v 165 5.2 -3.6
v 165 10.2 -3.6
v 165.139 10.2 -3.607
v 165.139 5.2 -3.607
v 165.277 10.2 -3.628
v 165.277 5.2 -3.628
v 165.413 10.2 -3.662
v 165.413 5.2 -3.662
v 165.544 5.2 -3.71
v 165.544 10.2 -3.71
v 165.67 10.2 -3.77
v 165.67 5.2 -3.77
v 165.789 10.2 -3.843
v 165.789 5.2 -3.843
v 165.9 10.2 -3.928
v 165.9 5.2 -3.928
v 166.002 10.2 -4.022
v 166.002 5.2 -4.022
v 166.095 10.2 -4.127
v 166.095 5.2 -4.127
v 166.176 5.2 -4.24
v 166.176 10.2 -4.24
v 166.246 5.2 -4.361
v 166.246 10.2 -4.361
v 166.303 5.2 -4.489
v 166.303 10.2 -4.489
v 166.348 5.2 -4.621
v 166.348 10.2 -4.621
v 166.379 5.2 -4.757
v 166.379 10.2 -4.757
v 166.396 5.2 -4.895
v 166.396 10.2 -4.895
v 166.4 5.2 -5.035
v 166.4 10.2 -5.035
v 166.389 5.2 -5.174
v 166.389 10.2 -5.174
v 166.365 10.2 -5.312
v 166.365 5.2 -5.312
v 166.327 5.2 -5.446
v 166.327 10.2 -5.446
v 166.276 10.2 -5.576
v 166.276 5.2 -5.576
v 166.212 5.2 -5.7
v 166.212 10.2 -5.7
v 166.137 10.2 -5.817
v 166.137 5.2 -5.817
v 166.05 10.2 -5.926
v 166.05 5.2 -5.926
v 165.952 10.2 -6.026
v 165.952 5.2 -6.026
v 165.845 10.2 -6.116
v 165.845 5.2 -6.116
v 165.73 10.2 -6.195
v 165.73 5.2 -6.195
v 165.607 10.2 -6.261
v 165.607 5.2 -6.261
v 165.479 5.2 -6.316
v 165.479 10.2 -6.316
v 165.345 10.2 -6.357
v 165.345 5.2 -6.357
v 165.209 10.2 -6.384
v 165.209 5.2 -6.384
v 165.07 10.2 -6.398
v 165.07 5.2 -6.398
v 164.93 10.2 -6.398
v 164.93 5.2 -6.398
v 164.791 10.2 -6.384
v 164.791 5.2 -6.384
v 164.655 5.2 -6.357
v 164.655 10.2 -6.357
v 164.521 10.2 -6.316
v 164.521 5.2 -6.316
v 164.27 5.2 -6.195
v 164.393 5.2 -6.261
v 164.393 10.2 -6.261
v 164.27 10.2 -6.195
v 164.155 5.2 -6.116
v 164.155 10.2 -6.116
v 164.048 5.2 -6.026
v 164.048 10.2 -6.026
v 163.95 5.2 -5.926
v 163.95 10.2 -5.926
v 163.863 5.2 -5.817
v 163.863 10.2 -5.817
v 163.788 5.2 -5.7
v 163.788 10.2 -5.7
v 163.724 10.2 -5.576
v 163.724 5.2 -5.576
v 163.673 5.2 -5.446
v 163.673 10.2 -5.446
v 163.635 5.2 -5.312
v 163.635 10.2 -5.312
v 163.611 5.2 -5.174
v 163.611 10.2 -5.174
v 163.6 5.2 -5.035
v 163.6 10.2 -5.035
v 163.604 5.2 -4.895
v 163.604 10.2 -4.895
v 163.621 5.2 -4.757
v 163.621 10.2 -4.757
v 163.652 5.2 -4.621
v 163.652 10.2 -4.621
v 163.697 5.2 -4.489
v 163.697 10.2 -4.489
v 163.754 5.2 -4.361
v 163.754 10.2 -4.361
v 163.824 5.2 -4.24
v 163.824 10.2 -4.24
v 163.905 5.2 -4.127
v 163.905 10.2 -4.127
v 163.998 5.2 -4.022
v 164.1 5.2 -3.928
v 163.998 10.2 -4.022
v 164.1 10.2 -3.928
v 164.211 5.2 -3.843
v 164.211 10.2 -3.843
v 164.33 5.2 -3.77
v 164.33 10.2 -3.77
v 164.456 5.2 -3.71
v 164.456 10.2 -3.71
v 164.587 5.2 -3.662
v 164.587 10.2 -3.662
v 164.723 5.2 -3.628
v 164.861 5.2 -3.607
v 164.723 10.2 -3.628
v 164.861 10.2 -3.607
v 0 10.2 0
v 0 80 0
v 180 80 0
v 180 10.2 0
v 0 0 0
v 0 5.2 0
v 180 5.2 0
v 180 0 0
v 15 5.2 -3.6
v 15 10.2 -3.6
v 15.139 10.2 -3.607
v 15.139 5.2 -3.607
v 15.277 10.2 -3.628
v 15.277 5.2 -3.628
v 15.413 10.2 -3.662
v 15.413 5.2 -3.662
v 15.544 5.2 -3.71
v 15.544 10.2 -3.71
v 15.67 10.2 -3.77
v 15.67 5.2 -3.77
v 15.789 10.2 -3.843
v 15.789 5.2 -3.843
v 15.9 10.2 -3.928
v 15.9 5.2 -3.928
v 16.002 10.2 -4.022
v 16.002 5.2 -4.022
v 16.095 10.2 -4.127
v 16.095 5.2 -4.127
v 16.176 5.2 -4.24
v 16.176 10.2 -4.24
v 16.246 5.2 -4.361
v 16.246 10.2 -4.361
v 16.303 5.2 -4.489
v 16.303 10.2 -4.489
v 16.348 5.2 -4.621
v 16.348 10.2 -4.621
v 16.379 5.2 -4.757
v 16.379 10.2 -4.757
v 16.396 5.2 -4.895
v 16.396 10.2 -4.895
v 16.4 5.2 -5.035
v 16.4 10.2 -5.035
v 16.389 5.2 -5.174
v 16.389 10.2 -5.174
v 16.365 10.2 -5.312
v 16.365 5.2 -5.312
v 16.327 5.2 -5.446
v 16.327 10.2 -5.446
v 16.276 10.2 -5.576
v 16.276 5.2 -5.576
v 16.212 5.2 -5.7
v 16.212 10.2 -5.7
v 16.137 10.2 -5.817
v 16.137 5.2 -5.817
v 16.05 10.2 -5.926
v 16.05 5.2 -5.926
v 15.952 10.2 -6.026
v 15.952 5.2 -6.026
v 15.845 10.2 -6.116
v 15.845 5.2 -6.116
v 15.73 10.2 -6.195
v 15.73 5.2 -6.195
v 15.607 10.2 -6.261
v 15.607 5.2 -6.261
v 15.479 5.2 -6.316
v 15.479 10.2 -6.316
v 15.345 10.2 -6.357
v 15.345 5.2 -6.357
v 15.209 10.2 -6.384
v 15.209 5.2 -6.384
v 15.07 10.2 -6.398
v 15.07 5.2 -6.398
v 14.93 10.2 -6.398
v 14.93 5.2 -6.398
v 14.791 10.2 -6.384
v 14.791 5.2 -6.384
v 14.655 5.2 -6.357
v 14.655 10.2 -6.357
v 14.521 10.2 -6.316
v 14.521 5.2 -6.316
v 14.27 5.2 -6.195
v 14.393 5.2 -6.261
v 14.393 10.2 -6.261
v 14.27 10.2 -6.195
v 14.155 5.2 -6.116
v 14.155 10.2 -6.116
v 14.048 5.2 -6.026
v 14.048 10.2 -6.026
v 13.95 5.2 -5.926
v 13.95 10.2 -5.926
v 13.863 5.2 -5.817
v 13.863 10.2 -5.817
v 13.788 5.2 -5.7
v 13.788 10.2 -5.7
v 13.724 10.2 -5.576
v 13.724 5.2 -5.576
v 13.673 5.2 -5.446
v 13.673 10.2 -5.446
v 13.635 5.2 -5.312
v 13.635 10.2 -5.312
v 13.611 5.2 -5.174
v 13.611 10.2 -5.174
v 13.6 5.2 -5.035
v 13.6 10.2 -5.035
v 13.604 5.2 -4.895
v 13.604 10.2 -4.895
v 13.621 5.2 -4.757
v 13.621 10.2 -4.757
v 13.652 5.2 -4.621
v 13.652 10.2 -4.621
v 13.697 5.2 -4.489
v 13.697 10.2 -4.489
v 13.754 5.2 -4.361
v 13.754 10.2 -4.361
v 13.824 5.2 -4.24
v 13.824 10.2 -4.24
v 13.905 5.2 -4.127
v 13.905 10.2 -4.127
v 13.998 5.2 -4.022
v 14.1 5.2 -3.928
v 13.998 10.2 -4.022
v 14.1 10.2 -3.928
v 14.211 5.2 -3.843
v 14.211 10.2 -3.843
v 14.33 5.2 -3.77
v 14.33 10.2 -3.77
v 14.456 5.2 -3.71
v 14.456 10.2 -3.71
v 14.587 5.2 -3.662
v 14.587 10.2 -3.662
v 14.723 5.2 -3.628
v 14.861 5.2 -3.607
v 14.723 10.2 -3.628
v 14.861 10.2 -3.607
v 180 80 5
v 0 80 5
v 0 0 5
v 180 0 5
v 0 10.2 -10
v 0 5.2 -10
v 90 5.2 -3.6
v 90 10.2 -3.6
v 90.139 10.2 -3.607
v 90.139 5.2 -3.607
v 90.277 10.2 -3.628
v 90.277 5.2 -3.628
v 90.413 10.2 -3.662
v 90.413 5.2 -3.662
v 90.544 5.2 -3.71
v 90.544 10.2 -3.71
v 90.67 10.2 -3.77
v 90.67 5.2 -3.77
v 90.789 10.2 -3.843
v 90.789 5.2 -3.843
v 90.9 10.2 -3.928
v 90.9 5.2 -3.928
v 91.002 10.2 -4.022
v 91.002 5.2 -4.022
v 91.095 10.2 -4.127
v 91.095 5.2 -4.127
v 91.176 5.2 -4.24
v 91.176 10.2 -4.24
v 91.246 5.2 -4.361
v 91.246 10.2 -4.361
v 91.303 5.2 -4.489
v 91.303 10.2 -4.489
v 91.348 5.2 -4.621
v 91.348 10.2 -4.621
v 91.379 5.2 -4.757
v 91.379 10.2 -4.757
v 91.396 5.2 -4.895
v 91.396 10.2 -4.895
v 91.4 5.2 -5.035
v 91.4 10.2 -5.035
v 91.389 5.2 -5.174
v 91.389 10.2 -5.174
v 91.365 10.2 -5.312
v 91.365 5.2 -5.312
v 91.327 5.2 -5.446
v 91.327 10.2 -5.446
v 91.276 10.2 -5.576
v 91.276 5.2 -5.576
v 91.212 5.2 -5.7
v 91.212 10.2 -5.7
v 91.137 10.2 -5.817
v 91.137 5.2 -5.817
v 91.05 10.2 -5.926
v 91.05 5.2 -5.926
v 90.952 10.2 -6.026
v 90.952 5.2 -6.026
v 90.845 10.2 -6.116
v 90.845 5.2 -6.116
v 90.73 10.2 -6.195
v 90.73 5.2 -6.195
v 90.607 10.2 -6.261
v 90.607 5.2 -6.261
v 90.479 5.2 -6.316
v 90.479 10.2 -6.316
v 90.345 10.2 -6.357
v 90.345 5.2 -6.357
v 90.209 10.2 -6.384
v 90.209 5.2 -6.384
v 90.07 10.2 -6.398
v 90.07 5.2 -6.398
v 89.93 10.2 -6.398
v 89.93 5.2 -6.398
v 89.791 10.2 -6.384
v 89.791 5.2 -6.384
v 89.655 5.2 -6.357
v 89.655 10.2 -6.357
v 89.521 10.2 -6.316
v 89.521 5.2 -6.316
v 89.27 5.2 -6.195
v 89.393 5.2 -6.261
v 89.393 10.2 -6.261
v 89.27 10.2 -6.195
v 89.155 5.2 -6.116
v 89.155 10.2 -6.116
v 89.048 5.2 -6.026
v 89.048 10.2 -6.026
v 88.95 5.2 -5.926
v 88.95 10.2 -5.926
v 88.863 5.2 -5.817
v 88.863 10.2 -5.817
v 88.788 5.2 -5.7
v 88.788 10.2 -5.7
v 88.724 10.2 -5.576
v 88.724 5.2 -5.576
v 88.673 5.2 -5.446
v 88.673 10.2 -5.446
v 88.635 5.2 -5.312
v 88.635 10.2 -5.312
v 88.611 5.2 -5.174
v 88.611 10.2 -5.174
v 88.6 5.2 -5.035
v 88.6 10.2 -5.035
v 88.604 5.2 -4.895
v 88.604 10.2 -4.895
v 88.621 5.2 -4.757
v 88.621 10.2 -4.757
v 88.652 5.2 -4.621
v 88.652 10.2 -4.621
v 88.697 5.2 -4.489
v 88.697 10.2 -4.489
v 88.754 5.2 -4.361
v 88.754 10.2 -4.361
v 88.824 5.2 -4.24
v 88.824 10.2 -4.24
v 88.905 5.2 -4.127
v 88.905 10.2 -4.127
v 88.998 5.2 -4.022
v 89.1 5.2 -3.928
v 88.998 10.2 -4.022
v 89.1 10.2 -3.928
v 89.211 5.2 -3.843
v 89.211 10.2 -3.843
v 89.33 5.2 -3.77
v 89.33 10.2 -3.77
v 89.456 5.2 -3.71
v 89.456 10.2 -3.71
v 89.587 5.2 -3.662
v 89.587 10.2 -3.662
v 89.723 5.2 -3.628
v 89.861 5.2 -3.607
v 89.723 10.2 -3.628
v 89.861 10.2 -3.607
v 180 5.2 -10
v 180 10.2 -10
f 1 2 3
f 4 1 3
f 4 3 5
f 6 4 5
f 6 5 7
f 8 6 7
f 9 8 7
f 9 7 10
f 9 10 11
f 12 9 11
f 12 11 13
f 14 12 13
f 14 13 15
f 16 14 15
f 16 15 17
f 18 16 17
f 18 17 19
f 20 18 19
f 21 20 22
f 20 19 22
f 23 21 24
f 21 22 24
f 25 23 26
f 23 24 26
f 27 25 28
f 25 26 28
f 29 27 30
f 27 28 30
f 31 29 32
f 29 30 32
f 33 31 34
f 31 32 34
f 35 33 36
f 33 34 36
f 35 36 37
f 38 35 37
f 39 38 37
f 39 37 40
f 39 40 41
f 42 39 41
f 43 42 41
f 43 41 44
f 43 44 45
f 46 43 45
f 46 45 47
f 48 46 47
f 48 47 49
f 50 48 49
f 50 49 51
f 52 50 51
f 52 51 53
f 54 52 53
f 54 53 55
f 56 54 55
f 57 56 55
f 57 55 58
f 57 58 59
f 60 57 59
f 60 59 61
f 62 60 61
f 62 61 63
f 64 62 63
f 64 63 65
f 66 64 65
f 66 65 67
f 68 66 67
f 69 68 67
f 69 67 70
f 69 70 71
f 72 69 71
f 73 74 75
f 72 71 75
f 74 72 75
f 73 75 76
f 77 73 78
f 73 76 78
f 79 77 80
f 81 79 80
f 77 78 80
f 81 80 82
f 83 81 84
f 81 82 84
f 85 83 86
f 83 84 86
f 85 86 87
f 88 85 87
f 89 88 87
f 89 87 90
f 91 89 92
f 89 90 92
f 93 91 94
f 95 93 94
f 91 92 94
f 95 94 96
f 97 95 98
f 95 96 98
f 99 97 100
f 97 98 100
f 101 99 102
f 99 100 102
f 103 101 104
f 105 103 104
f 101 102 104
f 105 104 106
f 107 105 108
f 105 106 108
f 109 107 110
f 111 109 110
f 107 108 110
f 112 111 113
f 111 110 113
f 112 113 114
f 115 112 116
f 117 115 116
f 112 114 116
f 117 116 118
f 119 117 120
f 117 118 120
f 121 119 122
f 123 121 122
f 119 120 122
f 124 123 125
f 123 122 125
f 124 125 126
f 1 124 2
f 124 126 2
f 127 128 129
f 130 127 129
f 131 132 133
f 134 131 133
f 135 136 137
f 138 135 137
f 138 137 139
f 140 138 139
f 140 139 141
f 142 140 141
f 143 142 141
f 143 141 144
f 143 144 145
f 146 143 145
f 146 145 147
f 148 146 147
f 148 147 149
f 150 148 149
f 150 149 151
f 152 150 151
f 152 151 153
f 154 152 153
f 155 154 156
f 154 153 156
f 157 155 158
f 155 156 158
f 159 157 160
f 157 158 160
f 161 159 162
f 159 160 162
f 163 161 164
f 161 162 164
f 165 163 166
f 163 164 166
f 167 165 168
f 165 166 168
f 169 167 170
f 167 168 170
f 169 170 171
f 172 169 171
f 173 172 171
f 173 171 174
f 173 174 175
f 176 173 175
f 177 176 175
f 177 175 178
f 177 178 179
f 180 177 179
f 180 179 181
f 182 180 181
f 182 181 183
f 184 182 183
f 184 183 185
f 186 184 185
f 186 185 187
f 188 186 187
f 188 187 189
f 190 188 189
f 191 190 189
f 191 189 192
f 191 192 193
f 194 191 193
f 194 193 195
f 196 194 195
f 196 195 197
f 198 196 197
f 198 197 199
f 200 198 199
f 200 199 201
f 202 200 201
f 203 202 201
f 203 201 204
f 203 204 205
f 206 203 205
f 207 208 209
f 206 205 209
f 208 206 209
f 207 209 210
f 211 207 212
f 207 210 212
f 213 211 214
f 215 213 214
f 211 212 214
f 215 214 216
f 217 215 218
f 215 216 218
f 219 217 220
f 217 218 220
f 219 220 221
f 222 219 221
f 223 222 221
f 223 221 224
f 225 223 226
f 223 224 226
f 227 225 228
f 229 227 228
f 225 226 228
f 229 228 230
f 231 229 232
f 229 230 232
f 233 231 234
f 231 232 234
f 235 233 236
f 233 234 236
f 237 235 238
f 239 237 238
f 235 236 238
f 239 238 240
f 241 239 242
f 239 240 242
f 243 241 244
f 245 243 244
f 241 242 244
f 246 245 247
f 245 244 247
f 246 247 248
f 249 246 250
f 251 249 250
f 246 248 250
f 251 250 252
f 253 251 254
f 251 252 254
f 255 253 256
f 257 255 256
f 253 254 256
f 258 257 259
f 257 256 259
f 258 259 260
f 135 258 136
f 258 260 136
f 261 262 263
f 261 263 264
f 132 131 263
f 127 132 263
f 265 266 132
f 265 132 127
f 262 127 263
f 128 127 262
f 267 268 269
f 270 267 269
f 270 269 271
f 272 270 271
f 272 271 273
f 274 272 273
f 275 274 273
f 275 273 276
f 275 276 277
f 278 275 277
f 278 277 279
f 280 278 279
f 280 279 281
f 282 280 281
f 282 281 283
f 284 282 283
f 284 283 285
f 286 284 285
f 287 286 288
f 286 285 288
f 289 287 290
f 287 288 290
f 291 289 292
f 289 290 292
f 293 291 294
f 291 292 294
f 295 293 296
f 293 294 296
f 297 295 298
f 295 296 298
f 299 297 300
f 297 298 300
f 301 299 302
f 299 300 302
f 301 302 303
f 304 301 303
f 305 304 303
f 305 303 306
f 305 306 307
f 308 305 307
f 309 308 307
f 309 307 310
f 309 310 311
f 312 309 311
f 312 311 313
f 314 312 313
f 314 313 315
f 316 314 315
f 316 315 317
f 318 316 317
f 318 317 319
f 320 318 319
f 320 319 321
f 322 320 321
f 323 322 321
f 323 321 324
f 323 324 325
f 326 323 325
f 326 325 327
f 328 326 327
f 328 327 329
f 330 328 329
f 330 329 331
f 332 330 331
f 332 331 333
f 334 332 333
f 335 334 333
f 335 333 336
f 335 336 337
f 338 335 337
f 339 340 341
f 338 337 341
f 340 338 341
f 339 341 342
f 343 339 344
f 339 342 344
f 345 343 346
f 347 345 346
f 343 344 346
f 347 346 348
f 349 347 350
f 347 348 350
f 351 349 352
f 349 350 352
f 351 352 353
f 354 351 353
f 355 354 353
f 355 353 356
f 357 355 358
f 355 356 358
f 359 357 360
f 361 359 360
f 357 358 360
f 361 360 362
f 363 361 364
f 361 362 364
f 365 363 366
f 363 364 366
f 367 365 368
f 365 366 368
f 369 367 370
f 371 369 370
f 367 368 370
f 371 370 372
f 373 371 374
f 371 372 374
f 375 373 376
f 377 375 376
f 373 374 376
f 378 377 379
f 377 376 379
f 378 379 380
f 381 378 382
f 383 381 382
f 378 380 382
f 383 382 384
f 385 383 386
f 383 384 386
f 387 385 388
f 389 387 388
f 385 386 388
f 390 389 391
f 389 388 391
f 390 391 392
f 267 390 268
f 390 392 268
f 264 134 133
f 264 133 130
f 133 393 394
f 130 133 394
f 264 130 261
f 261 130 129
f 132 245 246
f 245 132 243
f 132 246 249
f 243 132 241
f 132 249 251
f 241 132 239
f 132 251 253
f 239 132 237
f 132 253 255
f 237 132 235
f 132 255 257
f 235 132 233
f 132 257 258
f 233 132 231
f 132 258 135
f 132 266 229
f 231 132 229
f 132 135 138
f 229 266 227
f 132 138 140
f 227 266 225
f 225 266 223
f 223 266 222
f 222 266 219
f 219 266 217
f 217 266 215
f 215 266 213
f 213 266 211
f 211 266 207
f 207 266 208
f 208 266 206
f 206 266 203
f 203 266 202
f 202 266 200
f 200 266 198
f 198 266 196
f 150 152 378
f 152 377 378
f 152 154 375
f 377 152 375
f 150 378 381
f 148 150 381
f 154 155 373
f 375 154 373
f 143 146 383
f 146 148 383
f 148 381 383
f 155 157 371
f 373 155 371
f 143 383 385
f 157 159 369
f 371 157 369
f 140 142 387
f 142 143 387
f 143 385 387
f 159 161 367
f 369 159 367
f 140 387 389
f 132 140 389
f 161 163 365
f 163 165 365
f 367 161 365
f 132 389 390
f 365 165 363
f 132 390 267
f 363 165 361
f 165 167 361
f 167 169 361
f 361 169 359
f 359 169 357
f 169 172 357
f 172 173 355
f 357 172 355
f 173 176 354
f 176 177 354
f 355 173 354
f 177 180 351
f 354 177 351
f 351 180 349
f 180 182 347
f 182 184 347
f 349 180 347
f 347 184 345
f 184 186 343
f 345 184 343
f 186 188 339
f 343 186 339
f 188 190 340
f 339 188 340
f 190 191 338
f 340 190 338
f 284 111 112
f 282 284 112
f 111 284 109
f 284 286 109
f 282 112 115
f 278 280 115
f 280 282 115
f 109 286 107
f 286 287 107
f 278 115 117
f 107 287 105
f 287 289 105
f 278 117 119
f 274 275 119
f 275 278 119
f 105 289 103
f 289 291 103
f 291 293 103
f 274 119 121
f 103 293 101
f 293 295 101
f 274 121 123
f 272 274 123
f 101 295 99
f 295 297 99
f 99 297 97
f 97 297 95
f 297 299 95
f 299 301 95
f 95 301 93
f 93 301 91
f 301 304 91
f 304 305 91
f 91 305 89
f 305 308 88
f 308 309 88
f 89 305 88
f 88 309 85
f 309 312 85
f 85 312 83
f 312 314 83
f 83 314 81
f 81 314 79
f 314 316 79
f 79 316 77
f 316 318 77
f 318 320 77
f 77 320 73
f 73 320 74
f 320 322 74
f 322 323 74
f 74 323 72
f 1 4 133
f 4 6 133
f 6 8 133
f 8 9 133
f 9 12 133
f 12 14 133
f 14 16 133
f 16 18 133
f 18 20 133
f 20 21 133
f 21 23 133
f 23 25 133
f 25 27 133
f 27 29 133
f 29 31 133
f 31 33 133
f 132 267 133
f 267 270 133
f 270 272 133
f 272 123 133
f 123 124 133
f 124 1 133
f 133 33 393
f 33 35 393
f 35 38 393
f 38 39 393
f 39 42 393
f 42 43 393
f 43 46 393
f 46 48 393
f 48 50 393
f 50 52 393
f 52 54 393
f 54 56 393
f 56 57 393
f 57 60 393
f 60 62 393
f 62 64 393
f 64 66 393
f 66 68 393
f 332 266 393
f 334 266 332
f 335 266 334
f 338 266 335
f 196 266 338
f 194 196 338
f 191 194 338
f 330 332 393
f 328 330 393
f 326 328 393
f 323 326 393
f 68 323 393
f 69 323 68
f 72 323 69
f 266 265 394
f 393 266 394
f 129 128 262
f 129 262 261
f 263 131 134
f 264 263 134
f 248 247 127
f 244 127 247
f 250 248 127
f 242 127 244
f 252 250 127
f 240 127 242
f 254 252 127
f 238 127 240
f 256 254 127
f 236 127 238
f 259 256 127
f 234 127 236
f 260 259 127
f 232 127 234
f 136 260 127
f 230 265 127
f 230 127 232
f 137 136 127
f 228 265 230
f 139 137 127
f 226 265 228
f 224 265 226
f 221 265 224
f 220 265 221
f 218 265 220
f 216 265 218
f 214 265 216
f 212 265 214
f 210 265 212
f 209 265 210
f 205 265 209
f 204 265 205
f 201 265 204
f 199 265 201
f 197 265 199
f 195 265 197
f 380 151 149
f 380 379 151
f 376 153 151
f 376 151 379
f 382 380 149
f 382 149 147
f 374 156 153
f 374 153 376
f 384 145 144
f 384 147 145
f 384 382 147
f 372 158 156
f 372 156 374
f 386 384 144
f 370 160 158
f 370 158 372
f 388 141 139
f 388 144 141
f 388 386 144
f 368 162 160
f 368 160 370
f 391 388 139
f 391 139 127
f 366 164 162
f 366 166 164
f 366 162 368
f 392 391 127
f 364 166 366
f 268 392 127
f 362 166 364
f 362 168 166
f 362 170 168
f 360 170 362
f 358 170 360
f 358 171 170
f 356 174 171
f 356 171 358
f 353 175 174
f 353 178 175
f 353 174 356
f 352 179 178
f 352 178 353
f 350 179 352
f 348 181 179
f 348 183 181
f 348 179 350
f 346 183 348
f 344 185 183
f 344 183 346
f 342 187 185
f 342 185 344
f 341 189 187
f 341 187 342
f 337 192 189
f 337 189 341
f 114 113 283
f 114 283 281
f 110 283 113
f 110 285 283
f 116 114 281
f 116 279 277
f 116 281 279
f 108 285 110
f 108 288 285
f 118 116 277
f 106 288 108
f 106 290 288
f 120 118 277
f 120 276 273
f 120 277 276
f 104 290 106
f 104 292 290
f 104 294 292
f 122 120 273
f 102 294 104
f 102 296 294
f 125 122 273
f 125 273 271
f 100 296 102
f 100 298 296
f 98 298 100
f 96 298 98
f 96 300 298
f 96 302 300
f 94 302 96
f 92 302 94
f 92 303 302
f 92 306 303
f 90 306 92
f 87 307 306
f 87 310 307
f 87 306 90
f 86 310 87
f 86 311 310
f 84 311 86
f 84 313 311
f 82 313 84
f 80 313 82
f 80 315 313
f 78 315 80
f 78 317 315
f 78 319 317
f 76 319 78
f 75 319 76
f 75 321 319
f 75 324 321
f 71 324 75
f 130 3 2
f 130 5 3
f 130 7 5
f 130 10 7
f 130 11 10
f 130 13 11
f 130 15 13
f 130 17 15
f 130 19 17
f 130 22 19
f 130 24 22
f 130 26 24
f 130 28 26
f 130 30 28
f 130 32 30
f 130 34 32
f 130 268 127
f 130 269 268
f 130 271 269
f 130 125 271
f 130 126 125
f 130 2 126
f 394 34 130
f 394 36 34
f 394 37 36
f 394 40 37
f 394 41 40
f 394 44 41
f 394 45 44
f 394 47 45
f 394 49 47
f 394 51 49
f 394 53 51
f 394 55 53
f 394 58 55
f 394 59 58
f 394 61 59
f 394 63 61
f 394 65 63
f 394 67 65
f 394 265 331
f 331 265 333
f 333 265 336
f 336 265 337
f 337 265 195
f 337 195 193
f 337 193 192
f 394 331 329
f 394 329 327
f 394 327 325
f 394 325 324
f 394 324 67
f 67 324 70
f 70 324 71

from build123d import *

# Parameters (mm, degrees)
SKETCH1_W                = 180
SKETCH1_H                = 80
BOSS_EXTRUDE1_DEPTH      = 5
BOSS_EXTRUDE2_DEPTH      = 1
BOSS_EXTRUDE2_DEPTH_BACK = 10
SKETCH1_4_W              = 180
SKETCH1_4_H              = 5
CUT_EXTRUDE3_REACH       = 195.318
SKETCH2_R                = 1.4


with BuildPart() as part:
    # Sketch1 → Boss-Extrude1 (new body)
    with BuildSketch(Plane.XY):
        with Locations((90, 40)):
            Rectangle(SKETCH1_W, SKETCH1_H)
    extrude(amount=BOSS_EXTRUDE1_DEPTH)

    # Sketch1<4> → Boss-Extrude2 (add, two sides: drawn at the far end of the back side and taken through both)
    with BuildSketch(Plane.XY.offset(-BOSS_EXTRUDE2_DEPTH_BACK)):
        with Locations((90, 7.7)):
            Rectangle(SKETCH1_4_W, SKETCH1_4_H)
    extrude(amount=BOSS_EXTRUDE2_DEPTH + BOSS_EXTRUDE2_DEPTH_BACK)

    # Sketch2 → Cut-Extrude3 (cut, up to next)
    with BuildSketch(Plane(origin=(0, 10.2, 0), x_dir=(1, 0, 0), z_dir=(0, 1, 0)), mode=Mode.PRIVATE) as cut_extrude3_sk1:
        with Locations((15, 5)):
            Circle(SKETCH2_R)
    cut_extrude3_tool1 = extrude(cut_extrude3_sk1.sketch, amount=-CUT_EXTRUDE3_REACH, mode=Mode.PRIVATE) & part.part
    # Sketch2 → Cut-Extrude3 (cut, up to next)
    with BuildSketch(Plane(origin=(0, 10.2, 0), x_dir=(1, 0, 0), z_dir=(0, 1, 0)), mode=Mode.PRIVATE) as cut_extrude3_sk2:
        with Locations((90, 5)):
            Circle(SKETCH2_R)
    cut_extrude3_tool2 = extrude(cut_extrude3_sk2.sketch, amount=-CUT_EXTRUDE3_REACH, mode=Mode.PRIVATE) & part.part
    # Sketch2 → Cut-Extrude3 (cut, up to next)
    with BuildSketch(Plane(origin=(0, 10.2, 0), x_dir=(1, 0, 0), z_dir=(0, 1, 0)), mode=Mode.PRIVATE) as cut_extrude3_sk3:
        with Locations((165, 5)):
            Circle(SKETCH2_R)
    cut_extrude3_tool3 = extrude(cut_extrude3_sk3.sketch, amount=-CUT_EXTRUDE3_REACH, mode=Mode.PRIVATE) & part.part
    add(cut_extrude3_tool1.solids().sort_by_distance((15, 10.2, -5))[0], mode=Mode.SUBTRACT)
    add(cut_extrude3_tool2.solids().sort_by_distance((90, 10.2, -5))[0], mode=Mode.SUBTRACT)
    add(cut_extrude3_tool3.solids().sort_by_distance((165, 10.2, -5))[0], mode=Mode.SUBTRACT)


solid = part.part
